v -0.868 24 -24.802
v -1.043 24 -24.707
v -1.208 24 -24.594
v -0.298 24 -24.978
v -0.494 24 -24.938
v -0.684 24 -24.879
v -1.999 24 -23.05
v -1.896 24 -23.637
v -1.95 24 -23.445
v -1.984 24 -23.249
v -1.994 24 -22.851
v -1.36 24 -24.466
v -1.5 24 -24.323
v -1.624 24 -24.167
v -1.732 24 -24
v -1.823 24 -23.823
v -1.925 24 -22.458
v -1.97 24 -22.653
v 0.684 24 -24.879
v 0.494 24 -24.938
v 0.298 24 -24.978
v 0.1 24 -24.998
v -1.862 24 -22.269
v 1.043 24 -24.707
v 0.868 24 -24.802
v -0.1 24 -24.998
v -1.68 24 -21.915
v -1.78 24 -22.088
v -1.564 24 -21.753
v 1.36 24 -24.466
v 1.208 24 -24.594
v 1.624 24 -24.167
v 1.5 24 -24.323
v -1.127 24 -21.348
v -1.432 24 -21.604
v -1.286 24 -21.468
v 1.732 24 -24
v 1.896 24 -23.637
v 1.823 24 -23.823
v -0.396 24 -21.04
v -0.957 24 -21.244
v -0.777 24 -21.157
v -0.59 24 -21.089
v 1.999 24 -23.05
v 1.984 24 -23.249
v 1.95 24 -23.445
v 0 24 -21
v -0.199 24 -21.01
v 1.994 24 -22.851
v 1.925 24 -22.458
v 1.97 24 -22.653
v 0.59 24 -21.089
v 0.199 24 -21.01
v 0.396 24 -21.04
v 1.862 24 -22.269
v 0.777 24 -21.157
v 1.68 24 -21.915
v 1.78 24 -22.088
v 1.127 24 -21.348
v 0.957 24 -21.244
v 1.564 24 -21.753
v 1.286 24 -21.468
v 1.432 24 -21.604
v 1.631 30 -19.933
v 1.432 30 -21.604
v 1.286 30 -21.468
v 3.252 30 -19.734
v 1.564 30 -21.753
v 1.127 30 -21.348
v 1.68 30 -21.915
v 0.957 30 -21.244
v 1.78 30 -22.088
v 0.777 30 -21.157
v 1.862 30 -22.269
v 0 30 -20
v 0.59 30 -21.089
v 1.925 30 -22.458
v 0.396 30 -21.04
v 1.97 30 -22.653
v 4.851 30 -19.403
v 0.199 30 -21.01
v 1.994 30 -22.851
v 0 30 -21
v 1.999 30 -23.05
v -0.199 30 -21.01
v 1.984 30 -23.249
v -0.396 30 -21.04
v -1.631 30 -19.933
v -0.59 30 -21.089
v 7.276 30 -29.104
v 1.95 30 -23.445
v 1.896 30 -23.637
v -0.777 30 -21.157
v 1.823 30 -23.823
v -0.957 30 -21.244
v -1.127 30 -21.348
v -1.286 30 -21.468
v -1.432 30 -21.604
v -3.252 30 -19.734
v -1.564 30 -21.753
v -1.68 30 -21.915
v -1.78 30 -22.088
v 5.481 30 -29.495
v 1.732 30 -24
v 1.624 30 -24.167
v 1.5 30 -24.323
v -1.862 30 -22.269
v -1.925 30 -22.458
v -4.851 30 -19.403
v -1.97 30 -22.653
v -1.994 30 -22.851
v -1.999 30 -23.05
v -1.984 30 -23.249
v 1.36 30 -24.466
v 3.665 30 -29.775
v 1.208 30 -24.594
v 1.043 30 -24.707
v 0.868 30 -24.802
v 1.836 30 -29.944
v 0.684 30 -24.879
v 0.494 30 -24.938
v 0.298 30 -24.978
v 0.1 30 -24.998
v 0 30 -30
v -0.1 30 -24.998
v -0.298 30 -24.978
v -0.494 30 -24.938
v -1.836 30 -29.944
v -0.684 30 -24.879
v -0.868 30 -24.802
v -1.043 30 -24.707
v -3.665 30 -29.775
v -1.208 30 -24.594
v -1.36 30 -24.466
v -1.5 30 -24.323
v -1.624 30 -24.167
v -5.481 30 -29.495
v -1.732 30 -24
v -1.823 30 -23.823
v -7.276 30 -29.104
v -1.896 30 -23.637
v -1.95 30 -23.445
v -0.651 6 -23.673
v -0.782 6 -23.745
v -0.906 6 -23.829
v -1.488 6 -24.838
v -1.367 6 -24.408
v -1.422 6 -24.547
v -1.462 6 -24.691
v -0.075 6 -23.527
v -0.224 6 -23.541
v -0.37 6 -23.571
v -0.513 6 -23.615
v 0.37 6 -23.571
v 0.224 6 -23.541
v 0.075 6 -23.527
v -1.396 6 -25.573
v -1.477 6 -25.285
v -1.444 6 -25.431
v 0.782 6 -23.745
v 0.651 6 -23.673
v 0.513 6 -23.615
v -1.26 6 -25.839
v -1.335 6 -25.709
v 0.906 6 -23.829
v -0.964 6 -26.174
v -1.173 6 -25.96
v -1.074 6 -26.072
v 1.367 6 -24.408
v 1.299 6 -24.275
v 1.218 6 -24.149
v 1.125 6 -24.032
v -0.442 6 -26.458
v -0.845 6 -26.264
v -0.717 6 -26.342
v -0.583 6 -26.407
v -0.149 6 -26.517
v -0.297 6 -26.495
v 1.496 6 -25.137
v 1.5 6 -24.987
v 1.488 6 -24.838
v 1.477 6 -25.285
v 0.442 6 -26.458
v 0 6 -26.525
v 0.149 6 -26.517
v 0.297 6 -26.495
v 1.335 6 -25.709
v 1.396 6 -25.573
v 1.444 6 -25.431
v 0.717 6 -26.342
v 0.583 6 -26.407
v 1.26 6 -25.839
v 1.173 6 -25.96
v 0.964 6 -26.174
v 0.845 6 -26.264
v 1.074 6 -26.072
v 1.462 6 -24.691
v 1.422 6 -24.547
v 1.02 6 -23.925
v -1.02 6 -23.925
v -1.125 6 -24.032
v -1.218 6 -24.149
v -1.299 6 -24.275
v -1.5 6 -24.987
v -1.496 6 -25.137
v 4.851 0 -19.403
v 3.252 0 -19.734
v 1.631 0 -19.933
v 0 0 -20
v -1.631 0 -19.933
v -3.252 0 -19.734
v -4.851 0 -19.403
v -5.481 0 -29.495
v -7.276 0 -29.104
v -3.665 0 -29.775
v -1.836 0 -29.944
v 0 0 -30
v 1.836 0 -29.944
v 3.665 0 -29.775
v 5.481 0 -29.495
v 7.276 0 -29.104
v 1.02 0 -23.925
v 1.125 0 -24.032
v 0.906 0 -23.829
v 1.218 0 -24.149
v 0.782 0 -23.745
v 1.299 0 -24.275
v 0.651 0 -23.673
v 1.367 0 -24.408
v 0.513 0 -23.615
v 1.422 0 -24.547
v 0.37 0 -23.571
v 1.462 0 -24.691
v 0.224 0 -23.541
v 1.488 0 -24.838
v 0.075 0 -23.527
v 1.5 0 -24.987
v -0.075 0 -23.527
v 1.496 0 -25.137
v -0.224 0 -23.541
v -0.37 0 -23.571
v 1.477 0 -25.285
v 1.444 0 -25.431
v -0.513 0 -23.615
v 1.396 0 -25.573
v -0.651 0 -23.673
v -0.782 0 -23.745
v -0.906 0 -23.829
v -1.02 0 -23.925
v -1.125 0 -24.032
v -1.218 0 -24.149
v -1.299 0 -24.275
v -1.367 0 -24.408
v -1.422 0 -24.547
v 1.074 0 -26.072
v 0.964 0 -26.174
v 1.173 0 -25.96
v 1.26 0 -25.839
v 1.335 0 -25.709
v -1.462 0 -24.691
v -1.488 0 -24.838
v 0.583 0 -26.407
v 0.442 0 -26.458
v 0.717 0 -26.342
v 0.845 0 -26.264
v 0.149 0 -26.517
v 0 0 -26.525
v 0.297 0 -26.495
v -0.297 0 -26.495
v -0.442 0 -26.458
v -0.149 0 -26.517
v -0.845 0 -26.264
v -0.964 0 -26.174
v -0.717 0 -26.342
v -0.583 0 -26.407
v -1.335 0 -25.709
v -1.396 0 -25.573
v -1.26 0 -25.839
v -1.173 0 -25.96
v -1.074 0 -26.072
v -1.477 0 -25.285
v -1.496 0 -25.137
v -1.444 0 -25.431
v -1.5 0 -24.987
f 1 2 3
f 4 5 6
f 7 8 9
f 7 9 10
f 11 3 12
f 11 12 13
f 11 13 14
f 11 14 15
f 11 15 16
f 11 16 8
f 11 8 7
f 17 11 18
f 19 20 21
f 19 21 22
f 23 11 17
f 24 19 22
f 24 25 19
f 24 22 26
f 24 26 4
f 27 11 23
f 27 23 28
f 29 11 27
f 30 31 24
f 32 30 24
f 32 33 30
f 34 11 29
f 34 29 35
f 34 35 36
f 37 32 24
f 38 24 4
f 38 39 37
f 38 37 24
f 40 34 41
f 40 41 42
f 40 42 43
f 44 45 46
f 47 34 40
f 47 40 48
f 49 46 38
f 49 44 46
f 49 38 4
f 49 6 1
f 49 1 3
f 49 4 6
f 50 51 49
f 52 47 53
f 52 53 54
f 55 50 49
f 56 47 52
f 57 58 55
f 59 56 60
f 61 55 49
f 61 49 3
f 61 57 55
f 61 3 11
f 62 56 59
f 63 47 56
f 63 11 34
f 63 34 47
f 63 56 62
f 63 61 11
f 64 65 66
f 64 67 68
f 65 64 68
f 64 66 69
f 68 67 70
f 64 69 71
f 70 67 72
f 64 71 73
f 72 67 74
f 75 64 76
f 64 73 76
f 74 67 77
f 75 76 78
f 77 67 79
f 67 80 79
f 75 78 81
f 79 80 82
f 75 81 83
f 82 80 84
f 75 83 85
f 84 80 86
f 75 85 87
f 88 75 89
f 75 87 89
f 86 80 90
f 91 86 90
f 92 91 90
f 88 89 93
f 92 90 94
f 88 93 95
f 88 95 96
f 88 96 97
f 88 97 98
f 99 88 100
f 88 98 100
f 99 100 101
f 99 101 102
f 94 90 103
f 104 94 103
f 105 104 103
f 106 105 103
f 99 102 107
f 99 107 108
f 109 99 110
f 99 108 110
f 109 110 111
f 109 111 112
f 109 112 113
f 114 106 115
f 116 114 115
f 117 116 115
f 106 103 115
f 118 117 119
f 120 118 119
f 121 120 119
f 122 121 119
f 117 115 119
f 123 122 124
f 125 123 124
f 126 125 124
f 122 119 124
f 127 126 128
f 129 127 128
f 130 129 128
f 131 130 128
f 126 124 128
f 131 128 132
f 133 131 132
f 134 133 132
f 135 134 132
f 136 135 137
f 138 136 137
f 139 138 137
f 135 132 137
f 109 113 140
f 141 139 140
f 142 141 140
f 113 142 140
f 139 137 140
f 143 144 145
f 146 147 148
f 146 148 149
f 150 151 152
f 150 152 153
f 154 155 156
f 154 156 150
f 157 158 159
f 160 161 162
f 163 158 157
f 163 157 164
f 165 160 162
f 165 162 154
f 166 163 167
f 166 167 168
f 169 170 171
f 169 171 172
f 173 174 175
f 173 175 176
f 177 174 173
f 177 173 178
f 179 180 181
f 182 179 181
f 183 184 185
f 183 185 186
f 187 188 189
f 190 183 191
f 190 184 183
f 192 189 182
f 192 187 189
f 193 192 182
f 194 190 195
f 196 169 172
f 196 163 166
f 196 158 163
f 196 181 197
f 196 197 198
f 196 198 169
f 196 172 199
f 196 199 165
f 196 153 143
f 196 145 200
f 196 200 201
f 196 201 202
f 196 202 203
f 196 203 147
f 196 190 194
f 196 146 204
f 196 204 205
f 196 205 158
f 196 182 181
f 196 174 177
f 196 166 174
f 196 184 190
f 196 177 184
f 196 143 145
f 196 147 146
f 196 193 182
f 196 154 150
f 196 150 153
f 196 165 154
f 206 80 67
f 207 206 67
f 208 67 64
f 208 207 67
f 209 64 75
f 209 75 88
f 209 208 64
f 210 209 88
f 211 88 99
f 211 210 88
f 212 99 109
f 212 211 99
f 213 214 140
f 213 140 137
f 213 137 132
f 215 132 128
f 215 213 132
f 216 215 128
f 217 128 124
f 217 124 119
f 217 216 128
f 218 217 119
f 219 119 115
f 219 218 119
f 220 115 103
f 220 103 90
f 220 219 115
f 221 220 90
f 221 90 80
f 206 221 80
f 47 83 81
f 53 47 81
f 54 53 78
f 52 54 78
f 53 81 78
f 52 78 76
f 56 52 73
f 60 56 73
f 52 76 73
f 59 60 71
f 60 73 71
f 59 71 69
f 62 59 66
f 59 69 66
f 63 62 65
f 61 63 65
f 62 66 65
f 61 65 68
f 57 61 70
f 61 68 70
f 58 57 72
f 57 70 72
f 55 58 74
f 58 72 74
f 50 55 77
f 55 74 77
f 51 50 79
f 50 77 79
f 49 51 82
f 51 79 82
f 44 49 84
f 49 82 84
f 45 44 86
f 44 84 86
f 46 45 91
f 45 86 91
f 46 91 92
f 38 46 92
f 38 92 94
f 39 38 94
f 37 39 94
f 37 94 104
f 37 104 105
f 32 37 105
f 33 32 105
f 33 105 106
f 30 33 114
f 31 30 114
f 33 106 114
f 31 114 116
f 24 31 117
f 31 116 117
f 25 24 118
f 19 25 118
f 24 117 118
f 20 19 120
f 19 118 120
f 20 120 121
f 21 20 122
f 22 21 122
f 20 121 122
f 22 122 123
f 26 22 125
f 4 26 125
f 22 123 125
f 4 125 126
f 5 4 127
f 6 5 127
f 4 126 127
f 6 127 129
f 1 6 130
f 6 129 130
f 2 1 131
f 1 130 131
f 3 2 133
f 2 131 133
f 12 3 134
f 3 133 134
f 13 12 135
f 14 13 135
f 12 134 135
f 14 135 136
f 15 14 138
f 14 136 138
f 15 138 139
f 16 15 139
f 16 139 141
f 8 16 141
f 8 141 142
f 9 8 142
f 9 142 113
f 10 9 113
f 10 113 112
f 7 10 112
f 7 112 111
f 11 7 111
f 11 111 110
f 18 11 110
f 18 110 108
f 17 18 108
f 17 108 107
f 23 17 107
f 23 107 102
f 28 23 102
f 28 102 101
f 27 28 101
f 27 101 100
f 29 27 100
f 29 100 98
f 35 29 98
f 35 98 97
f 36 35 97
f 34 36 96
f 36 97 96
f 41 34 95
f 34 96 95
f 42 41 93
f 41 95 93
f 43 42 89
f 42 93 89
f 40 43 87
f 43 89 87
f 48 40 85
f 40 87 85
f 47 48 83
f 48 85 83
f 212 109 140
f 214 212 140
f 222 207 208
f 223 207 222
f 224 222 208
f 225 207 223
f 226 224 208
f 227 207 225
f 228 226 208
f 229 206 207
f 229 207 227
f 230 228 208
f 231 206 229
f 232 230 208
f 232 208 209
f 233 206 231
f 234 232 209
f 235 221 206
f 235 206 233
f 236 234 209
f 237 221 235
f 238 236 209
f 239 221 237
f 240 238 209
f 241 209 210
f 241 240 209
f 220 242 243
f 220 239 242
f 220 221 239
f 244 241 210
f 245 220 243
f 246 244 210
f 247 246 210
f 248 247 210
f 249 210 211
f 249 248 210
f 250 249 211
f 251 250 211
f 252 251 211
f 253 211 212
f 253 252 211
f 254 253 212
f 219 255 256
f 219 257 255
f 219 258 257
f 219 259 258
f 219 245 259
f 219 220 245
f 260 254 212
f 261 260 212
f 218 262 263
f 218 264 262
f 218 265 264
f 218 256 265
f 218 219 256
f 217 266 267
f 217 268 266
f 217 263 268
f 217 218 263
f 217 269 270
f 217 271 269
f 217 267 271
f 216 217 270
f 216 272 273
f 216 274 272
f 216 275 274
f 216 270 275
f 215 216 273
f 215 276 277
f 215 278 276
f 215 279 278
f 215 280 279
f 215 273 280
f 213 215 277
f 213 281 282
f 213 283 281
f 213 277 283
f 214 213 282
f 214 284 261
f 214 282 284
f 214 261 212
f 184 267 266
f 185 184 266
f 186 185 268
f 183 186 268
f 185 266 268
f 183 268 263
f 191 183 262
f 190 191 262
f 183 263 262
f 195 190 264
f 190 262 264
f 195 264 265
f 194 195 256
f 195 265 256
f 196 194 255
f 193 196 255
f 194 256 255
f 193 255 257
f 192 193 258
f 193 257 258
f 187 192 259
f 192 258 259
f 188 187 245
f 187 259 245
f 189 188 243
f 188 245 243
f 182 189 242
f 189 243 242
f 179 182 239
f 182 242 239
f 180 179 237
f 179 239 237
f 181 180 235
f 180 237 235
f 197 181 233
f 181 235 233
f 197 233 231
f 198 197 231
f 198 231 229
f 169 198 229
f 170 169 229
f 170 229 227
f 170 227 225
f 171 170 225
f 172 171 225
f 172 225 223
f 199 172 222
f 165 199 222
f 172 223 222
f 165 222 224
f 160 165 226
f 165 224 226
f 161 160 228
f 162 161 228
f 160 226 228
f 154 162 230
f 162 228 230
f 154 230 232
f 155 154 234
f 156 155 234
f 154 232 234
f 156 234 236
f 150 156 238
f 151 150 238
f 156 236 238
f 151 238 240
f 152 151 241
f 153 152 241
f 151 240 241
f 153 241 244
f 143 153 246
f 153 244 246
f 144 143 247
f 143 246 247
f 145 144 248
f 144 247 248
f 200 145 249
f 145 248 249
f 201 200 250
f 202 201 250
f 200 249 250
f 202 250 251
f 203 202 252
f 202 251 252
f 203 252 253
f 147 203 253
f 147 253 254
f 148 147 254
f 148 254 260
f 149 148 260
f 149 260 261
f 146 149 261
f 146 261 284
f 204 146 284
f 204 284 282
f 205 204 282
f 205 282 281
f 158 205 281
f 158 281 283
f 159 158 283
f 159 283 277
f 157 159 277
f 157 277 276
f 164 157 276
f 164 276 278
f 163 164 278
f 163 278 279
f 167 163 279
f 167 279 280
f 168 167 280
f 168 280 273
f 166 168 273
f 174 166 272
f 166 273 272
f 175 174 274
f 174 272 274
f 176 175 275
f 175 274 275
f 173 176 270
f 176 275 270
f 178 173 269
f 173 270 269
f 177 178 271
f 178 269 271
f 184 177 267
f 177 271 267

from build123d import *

# Parameters (mm, degrees)
BOSS_EXTRUDE2_DEPTH = 30
SKETCH3_R           = 1.5
CUT_EXTRUDE1_DEPTH  = 6
SKETCH4_R           = 2
CUT_EXTRUDE2_DEPTH  = 6


with BuildPart() as part:
    # Sketch1 → Boss-Extrude2 (new body)
    with BuildSketch(Plane(origin=(0, 0, 0), x_dir=(1, 0, 0), z_dir=(0, 1, 0))):
        with BuildLine():
            Line((-4.850712501, 19.402850003), (-7.276068751, 29.104275004))
            ThreePointArc((-7.276068751, 29.104275004), (0, 30), (7.276068751, 29.104275004))
            Line((7.276068751, 29.104275004), (4.850712501, 19.402850003))
            ThreePointArc((4.850712501, 19.402850003), (0, 20), (-4.850712501, 19.402850003))
        make_face()
    extrude(amount=BOSS_EXTRUDE2_DEPTH)

    # Sketch3 → Cut-Extrude1 (cut)
    with BuildSketch(Plane.XZ):
        with Locations(Location((0, -25.024693025, 0), (0, 0, 270))):
            Circle(SKETCH3_R)
    extrude(amount=-CUT_EXTRUDE1_DEPTH, mode=Mode.SUBTRACT)

    # Sketch4 → Cut-Extrude2 (cut)
    with BuildSketch(Plane(origin=(0, 30, 0), x_dir=(1, 0, 0), z_dir=(0, 1, 0))):
        with Locations(Location((0, 23, 0), (0, 0, 270))):
            Circle(SKETCH4_R)
    extrude(amount=-CUT_EXTRUDE2_DEPTH, mode=Mode.SUBTRACT)


solid = part.part
